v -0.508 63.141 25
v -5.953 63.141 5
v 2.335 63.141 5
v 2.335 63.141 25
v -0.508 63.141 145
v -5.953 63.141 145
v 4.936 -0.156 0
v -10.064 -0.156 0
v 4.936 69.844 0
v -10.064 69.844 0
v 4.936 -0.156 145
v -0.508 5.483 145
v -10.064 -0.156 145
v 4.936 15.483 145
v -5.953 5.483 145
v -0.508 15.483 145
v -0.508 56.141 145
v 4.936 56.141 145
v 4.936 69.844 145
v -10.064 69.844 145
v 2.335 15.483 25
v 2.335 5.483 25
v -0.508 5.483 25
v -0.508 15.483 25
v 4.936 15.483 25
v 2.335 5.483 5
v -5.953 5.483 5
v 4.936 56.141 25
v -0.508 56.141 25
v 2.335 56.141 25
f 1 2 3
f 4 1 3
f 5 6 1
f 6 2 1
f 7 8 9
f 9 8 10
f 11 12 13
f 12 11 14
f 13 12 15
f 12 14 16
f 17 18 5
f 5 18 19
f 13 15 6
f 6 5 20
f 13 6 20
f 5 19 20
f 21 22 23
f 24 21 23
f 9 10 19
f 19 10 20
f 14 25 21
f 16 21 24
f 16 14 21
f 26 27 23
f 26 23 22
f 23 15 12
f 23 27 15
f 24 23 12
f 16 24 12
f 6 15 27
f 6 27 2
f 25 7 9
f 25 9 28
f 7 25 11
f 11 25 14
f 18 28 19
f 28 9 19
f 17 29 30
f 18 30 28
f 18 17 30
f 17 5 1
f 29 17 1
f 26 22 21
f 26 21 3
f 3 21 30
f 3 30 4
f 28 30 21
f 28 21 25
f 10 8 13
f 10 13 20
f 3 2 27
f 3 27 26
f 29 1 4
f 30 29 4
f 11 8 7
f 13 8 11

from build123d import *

# Parameters (mm, degrees)
F0_W      = 10
F0_H      = 70
F1_DEPTH  = 145
F2_DEPTH  = 5
F3_W      = 8.287649136
F3_H      = 57.6572036371
F4_DEPTH  = 140
F5_W      = 2.6011180505
F5_H      = 57.6572036371
F6_DEPTH  = 120
F8_DEPTH  = 10
F10_DEPTH = 7


with BuildPart() as f1:
    # F0 (on Top) → F1 (new body)
    with BuildSketch(Plane.XY):
        with Locations((-5.0640162081, 34.8435932503)):
            Rectangle(F0_W, F0_H)
    extrude(amount=F1_DEPTH)

    # F2 (add): a face of the model
    f2_faces = [f1.faces().sort_by_distance(p)[0] for p in [
        (-0.0640162081, 34.8435932503, 72.5),
    ]]
    extrude(f2_faces, amount=F2_DEPTH)

    # F3 (on face) → F4 (cut)
    with BuildSketch(Plane.XY.offset(145)):
        with Locations((-1.8089588266, 34.3119842)):
            Rectangle(F3_W, F3_H)
    extrude(amount=-F4_DEPTH, mode=Mode.SUBTRACT)

    # F5 (on face) → F6 (cut)
    with BuildSketch(Plane.XY.offset(145)):
        with Locations((3.6354247667, 34.3119842)):
            Rectangle(F5_W, F5_H)
    extrude(amount=-F6_DEPTH, mode=Mode.SUBTRACT)

    # F7 (on face) → F8 (join)
    with BuildSketch(Plane(origin=(0, 5.4833823815, 0), x_dir=(-1, 0, 0), z_dir=(0, 1, 0))):
        Polygon((0.5083998013, 25), (0.5083998013, 145), (-4.9359837919, 145), (-4.9359837919, 25), (-2.3348657414, 25), align=None)
    extrude(amount=F8_DEPTH)

    # F9 (on face) → F10 (join)
    with BuildSketch(Plane.XZ.offset(-63.1405860186)):
        Polygon((4.9359837919, 145), (-0.5083998013, 145), (-0.5083998013, 25), (2.3348657414, 25), (4.9359837919, 25), align=None)
    extrude(amount=F10_DEPTH)


solid = f1.part
